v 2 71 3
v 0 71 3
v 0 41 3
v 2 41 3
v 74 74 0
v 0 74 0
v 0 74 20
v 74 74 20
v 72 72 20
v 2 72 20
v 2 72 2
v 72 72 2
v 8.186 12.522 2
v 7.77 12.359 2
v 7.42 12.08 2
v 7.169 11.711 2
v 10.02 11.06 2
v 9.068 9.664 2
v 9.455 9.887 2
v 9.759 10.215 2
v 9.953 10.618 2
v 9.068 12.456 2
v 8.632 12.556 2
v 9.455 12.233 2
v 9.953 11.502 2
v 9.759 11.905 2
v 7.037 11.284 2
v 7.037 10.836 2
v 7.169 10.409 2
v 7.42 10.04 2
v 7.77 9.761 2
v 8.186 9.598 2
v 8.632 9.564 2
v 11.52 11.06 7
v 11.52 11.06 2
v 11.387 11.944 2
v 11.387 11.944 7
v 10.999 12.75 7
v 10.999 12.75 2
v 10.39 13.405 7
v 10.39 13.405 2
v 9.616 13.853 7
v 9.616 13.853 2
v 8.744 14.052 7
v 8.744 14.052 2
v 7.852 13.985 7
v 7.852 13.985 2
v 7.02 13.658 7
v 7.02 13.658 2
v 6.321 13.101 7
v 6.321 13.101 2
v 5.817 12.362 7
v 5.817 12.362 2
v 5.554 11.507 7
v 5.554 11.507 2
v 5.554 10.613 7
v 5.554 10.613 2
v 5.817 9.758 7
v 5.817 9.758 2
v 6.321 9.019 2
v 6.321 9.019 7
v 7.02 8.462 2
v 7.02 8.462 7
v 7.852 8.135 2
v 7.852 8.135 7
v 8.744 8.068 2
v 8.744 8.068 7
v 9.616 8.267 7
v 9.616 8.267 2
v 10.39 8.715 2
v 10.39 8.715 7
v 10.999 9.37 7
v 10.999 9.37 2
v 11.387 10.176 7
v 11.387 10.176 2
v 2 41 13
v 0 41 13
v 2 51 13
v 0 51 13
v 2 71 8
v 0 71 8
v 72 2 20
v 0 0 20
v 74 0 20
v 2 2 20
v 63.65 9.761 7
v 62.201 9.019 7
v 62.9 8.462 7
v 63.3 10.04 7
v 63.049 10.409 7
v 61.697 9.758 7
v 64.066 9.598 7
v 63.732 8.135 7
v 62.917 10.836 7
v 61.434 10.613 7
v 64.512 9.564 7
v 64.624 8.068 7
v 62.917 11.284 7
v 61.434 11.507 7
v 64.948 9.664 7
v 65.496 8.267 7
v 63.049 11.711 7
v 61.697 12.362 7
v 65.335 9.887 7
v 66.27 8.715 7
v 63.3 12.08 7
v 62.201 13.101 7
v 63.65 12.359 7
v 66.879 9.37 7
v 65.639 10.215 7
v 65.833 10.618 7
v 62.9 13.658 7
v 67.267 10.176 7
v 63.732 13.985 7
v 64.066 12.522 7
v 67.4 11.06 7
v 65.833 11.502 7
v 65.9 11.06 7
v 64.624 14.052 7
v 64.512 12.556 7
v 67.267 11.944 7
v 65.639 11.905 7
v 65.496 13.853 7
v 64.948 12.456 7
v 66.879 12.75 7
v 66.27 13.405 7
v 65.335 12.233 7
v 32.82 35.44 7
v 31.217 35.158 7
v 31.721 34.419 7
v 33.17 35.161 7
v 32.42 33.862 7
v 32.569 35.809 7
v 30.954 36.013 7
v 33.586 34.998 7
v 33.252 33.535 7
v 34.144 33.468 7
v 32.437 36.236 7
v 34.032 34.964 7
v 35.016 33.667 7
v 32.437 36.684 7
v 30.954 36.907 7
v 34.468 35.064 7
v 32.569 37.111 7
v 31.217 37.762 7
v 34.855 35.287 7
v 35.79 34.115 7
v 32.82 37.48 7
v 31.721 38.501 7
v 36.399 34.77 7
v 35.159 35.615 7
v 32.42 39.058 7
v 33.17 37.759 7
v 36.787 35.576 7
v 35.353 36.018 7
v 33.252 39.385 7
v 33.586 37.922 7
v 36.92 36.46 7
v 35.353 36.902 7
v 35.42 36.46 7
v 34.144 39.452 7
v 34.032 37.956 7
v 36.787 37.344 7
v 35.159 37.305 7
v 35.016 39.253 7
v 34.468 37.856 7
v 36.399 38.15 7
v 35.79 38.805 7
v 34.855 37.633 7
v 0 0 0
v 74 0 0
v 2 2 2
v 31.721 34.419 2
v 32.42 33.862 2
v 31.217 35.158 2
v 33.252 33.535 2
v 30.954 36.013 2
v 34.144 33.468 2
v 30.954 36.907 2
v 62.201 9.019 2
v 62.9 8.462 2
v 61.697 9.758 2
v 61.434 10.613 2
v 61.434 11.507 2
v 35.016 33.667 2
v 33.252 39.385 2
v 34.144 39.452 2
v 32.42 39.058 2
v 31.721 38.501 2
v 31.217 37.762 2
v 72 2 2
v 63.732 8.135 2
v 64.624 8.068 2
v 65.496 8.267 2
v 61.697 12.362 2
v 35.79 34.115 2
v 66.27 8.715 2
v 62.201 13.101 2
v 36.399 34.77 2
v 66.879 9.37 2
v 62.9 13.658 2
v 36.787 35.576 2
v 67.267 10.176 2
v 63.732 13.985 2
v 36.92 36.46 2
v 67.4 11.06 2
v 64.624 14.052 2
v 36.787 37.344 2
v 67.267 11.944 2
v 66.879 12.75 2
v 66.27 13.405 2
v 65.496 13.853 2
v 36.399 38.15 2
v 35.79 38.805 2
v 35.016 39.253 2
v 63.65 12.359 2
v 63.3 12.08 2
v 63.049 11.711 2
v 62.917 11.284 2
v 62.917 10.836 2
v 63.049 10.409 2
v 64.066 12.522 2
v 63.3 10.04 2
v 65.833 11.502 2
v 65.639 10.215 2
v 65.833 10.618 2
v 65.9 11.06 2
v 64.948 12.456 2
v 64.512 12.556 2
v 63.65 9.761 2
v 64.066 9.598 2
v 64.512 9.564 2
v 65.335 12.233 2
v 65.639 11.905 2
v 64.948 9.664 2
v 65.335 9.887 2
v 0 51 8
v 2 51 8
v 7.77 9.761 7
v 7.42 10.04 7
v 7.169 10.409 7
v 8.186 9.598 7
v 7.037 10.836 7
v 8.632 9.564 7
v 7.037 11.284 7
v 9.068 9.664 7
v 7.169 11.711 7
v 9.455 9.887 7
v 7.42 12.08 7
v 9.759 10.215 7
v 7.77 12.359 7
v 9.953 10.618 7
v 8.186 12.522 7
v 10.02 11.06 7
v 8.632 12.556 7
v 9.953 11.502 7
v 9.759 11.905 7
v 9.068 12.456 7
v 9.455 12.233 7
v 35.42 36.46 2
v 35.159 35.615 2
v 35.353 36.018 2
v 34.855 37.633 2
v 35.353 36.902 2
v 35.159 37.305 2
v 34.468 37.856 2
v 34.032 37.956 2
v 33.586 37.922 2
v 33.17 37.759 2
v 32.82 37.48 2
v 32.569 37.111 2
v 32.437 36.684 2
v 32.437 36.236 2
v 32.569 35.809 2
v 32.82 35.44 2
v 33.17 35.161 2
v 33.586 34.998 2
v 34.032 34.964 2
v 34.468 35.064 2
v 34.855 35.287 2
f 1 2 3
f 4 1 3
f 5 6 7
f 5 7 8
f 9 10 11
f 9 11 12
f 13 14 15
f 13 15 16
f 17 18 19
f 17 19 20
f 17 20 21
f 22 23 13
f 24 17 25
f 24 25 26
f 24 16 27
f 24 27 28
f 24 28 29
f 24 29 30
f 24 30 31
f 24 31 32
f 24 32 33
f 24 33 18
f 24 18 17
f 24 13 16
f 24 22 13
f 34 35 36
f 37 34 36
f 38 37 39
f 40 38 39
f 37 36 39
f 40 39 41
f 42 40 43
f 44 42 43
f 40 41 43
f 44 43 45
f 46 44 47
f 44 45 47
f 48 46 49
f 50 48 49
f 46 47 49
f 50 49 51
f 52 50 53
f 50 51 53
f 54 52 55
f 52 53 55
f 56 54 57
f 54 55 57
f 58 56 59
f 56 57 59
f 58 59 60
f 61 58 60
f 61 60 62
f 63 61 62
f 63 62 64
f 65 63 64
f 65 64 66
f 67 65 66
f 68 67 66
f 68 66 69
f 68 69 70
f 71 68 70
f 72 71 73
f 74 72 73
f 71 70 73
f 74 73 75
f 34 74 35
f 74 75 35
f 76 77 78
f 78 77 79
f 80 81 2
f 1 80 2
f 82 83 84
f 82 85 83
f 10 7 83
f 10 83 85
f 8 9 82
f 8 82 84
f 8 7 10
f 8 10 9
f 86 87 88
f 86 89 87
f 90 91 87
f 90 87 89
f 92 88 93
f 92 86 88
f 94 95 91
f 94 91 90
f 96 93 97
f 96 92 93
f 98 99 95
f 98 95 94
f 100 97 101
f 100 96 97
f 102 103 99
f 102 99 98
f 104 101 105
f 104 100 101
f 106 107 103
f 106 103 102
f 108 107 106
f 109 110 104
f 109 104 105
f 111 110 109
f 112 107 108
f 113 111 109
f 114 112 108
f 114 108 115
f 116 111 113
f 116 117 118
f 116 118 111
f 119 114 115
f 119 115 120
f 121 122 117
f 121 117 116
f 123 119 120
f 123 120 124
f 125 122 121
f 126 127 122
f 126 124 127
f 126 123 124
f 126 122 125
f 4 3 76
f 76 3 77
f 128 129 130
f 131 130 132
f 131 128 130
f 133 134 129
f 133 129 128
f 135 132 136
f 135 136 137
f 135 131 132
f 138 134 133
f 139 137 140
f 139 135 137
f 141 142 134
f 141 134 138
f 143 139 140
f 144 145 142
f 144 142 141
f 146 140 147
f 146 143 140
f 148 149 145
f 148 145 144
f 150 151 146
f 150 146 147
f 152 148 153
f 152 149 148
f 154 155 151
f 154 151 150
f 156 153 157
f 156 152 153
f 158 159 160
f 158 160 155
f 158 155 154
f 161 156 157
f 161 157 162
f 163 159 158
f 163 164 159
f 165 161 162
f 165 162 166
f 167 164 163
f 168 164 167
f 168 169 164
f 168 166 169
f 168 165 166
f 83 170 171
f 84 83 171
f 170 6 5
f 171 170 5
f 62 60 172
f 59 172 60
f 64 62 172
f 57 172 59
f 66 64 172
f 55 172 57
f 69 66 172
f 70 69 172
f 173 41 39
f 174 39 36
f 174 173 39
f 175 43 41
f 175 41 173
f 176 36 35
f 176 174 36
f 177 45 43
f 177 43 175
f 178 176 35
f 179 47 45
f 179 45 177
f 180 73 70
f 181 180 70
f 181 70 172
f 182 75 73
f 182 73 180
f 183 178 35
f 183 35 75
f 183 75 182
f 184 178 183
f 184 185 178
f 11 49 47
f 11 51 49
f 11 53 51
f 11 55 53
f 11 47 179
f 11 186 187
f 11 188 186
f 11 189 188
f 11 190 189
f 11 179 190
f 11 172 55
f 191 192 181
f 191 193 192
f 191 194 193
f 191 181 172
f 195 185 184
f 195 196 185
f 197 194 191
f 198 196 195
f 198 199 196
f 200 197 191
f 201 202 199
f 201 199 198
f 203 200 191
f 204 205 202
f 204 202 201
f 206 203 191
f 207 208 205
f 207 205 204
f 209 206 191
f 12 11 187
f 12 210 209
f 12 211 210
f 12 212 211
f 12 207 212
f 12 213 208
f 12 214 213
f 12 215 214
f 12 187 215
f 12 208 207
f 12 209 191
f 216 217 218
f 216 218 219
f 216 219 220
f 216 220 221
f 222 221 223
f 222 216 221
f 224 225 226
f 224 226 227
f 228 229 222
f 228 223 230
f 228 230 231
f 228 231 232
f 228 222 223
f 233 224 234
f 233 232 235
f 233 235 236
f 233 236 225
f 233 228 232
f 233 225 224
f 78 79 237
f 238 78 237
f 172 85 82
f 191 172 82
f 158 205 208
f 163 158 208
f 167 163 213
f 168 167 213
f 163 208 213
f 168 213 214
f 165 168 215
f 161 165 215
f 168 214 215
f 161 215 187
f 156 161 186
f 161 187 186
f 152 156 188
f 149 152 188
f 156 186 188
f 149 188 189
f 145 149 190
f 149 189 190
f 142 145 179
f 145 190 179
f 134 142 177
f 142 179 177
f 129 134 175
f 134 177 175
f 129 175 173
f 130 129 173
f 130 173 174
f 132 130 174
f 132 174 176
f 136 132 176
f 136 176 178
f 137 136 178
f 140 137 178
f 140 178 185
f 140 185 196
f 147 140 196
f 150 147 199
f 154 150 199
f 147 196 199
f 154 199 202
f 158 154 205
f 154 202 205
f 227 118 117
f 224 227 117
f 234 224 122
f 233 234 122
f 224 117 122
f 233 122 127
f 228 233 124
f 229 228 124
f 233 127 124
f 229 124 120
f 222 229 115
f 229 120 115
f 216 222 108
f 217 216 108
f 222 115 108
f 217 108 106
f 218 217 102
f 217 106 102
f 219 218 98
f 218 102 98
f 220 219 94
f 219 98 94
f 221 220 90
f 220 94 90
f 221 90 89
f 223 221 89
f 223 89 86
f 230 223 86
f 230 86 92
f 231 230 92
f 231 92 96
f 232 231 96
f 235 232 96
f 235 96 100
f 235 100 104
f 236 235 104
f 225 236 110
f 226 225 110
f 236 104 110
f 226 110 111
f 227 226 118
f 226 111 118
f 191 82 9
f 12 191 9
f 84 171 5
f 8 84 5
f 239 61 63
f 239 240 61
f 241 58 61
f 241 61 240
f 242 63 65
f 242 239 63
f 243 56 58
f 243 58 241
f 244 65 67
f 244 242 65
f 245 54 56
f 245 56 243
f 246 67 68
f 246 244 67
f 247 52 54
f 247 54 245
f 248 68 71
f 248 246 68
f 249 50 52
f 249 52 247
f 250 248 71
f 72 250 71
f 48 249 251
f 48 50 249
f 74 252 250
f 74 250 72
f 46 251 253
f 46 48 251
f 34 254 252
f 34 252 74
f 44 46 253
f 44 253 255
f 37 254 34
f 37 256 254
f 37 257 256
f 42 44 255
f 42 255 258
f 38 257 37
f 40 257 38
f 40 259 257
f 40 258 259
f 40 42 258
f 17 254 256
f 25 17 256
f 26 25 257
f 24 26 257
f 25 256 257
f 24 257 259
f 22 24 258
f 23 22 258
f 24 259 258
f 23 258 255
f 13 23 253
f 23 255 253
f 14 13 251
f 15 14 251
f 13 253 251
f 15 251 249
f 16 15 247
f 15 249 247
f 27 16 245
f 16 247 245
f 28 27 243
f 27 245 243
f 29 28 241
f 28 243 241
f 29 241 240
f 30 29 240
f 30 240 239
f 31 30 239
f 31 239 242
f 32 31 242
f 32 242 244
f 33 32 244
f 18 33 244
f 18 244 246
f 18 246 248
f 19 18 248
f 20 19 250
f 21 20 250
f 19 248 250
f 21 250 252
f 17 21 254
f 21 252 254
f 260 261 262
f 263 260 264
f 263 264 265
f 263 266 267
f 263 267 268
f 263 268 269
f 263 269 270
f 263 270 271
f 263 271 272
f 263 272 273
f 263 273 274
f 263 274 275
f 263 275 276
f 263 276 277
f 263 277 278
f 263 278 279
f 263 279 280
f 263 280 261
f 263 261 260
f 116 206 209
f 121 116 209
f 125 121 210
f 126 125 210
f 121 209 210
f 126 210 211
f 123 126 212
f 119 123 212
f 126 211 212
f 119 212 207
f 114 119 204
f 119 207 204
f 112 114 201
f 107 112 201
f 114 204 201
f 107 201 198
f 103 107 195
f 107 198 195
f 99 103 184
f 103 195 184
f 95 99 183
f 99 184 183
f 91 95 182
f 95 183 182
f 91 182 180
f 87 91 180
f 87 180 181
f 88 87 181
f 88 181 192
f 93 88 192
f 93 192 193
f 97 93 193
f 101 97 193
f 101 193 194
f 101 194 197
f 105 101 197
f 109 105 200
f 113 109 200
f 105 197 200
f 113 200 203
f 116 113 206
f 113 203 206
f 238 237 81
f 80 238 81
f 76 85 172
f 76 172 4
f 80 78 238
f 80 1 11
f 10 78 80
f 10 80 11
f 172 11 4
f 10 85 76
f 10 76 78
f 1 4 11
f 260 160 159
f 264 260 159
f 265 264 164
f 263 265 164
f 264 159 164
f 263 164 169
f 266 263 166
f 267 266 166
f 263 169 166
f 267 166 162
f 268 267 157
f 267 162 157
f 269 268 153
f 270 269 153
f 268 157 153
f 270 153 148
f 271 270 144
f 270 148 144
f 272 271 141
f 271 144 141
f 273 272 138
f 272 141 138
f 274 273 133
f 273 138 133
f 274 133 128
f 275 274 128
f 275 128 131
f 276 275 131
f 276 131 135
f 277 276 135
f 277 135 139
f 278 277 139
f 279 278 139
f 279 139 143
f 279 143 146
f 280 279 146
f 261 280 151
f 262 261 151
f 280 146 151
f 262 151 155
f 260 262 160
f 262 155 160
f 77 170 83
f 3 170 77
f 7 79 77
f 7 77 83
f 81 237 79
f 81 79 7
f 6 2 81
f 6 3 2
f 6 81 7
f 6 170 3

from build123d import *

# Parameters (mm, degrees)
SKETCH002_W     = 74
SKETCH002_H     = 74
PAD001_DEPTH    = 20
SKETCH003_W     = 70
SKETCH003_H     = 70
POCKET001_DEPTH = 18
SKETCH_R        = 3
PAD_DEPTH       = 5
SKETCH004_R     = 1.5
POCKET_DEPTH    = 5
POCKET002_DEPTH = 2


with BuildPart() as part:
    # Sketch002 → Pad001 (new body)
    with BuildSketch(Plane.XY):
        with Locations((37, 37)):
            Rectangle(SKETCH002_W, SKETCH002_H)
    extrude(amount=PAD001_DEPTH)

    # Sketch003 (on Face6 of Pad001) → Pocket001 (cut)
    with BuildSketch(Plane.XY.offset(20)):
        with Locations((37, 37)):
            Rectangle(SKETCH003_W, SKETCH003_H)
    extrude(amount=-POCKET001_DEPTH, mode=Mode.SUBTRACT)

    # Sketch (on Face11 of Pocket001) → Pad (join)
    with BuildSketch(Plane.XY.offset(2)):
        with Locations((8.52, 11.06)):
            Circle(SKETCH_R)
        with Locations((33.92, 36.46)):
            Circle(SKETCH_R)
        with Locations((64.4, 11.06)):
            Circle(SKETCH_R)
    extrude(amount=PAD_DEPTH)

    # Sketch004 (on Face17 of Pad) → Pocket (cut)
    with BuildSketch(Plane.XY.offset(7)):
        with Locations((8.52, 11.06)):
            Circle(SKETCH004_R)
        with Locations((64.4, 11.06)):
            Circle(SKETCH004_R)
        with Locations((33.92, 36.46)):
            Circle(SKETCH004_R)
    extrude(amount=-POCKET_DEPTH, mode=Mode.SUBTRACT)

    # Sketch005 (on Face2 of Pocket) → Pocket002 (cut)
    with BuildSketch(Plane(origin=(0, 0, 0), x_dir=(0, -1, 0), z_dir=(-1, 0, 0))):
        Polygon((-71, 8), (-71, 3), (-41, 3), (-41, 13), (-51, 13), (-51, 8), align=None)
    extrude(amount=-POCKET002_DEPTH, mode=Mode.SUBTRACT)


solid = part.part
